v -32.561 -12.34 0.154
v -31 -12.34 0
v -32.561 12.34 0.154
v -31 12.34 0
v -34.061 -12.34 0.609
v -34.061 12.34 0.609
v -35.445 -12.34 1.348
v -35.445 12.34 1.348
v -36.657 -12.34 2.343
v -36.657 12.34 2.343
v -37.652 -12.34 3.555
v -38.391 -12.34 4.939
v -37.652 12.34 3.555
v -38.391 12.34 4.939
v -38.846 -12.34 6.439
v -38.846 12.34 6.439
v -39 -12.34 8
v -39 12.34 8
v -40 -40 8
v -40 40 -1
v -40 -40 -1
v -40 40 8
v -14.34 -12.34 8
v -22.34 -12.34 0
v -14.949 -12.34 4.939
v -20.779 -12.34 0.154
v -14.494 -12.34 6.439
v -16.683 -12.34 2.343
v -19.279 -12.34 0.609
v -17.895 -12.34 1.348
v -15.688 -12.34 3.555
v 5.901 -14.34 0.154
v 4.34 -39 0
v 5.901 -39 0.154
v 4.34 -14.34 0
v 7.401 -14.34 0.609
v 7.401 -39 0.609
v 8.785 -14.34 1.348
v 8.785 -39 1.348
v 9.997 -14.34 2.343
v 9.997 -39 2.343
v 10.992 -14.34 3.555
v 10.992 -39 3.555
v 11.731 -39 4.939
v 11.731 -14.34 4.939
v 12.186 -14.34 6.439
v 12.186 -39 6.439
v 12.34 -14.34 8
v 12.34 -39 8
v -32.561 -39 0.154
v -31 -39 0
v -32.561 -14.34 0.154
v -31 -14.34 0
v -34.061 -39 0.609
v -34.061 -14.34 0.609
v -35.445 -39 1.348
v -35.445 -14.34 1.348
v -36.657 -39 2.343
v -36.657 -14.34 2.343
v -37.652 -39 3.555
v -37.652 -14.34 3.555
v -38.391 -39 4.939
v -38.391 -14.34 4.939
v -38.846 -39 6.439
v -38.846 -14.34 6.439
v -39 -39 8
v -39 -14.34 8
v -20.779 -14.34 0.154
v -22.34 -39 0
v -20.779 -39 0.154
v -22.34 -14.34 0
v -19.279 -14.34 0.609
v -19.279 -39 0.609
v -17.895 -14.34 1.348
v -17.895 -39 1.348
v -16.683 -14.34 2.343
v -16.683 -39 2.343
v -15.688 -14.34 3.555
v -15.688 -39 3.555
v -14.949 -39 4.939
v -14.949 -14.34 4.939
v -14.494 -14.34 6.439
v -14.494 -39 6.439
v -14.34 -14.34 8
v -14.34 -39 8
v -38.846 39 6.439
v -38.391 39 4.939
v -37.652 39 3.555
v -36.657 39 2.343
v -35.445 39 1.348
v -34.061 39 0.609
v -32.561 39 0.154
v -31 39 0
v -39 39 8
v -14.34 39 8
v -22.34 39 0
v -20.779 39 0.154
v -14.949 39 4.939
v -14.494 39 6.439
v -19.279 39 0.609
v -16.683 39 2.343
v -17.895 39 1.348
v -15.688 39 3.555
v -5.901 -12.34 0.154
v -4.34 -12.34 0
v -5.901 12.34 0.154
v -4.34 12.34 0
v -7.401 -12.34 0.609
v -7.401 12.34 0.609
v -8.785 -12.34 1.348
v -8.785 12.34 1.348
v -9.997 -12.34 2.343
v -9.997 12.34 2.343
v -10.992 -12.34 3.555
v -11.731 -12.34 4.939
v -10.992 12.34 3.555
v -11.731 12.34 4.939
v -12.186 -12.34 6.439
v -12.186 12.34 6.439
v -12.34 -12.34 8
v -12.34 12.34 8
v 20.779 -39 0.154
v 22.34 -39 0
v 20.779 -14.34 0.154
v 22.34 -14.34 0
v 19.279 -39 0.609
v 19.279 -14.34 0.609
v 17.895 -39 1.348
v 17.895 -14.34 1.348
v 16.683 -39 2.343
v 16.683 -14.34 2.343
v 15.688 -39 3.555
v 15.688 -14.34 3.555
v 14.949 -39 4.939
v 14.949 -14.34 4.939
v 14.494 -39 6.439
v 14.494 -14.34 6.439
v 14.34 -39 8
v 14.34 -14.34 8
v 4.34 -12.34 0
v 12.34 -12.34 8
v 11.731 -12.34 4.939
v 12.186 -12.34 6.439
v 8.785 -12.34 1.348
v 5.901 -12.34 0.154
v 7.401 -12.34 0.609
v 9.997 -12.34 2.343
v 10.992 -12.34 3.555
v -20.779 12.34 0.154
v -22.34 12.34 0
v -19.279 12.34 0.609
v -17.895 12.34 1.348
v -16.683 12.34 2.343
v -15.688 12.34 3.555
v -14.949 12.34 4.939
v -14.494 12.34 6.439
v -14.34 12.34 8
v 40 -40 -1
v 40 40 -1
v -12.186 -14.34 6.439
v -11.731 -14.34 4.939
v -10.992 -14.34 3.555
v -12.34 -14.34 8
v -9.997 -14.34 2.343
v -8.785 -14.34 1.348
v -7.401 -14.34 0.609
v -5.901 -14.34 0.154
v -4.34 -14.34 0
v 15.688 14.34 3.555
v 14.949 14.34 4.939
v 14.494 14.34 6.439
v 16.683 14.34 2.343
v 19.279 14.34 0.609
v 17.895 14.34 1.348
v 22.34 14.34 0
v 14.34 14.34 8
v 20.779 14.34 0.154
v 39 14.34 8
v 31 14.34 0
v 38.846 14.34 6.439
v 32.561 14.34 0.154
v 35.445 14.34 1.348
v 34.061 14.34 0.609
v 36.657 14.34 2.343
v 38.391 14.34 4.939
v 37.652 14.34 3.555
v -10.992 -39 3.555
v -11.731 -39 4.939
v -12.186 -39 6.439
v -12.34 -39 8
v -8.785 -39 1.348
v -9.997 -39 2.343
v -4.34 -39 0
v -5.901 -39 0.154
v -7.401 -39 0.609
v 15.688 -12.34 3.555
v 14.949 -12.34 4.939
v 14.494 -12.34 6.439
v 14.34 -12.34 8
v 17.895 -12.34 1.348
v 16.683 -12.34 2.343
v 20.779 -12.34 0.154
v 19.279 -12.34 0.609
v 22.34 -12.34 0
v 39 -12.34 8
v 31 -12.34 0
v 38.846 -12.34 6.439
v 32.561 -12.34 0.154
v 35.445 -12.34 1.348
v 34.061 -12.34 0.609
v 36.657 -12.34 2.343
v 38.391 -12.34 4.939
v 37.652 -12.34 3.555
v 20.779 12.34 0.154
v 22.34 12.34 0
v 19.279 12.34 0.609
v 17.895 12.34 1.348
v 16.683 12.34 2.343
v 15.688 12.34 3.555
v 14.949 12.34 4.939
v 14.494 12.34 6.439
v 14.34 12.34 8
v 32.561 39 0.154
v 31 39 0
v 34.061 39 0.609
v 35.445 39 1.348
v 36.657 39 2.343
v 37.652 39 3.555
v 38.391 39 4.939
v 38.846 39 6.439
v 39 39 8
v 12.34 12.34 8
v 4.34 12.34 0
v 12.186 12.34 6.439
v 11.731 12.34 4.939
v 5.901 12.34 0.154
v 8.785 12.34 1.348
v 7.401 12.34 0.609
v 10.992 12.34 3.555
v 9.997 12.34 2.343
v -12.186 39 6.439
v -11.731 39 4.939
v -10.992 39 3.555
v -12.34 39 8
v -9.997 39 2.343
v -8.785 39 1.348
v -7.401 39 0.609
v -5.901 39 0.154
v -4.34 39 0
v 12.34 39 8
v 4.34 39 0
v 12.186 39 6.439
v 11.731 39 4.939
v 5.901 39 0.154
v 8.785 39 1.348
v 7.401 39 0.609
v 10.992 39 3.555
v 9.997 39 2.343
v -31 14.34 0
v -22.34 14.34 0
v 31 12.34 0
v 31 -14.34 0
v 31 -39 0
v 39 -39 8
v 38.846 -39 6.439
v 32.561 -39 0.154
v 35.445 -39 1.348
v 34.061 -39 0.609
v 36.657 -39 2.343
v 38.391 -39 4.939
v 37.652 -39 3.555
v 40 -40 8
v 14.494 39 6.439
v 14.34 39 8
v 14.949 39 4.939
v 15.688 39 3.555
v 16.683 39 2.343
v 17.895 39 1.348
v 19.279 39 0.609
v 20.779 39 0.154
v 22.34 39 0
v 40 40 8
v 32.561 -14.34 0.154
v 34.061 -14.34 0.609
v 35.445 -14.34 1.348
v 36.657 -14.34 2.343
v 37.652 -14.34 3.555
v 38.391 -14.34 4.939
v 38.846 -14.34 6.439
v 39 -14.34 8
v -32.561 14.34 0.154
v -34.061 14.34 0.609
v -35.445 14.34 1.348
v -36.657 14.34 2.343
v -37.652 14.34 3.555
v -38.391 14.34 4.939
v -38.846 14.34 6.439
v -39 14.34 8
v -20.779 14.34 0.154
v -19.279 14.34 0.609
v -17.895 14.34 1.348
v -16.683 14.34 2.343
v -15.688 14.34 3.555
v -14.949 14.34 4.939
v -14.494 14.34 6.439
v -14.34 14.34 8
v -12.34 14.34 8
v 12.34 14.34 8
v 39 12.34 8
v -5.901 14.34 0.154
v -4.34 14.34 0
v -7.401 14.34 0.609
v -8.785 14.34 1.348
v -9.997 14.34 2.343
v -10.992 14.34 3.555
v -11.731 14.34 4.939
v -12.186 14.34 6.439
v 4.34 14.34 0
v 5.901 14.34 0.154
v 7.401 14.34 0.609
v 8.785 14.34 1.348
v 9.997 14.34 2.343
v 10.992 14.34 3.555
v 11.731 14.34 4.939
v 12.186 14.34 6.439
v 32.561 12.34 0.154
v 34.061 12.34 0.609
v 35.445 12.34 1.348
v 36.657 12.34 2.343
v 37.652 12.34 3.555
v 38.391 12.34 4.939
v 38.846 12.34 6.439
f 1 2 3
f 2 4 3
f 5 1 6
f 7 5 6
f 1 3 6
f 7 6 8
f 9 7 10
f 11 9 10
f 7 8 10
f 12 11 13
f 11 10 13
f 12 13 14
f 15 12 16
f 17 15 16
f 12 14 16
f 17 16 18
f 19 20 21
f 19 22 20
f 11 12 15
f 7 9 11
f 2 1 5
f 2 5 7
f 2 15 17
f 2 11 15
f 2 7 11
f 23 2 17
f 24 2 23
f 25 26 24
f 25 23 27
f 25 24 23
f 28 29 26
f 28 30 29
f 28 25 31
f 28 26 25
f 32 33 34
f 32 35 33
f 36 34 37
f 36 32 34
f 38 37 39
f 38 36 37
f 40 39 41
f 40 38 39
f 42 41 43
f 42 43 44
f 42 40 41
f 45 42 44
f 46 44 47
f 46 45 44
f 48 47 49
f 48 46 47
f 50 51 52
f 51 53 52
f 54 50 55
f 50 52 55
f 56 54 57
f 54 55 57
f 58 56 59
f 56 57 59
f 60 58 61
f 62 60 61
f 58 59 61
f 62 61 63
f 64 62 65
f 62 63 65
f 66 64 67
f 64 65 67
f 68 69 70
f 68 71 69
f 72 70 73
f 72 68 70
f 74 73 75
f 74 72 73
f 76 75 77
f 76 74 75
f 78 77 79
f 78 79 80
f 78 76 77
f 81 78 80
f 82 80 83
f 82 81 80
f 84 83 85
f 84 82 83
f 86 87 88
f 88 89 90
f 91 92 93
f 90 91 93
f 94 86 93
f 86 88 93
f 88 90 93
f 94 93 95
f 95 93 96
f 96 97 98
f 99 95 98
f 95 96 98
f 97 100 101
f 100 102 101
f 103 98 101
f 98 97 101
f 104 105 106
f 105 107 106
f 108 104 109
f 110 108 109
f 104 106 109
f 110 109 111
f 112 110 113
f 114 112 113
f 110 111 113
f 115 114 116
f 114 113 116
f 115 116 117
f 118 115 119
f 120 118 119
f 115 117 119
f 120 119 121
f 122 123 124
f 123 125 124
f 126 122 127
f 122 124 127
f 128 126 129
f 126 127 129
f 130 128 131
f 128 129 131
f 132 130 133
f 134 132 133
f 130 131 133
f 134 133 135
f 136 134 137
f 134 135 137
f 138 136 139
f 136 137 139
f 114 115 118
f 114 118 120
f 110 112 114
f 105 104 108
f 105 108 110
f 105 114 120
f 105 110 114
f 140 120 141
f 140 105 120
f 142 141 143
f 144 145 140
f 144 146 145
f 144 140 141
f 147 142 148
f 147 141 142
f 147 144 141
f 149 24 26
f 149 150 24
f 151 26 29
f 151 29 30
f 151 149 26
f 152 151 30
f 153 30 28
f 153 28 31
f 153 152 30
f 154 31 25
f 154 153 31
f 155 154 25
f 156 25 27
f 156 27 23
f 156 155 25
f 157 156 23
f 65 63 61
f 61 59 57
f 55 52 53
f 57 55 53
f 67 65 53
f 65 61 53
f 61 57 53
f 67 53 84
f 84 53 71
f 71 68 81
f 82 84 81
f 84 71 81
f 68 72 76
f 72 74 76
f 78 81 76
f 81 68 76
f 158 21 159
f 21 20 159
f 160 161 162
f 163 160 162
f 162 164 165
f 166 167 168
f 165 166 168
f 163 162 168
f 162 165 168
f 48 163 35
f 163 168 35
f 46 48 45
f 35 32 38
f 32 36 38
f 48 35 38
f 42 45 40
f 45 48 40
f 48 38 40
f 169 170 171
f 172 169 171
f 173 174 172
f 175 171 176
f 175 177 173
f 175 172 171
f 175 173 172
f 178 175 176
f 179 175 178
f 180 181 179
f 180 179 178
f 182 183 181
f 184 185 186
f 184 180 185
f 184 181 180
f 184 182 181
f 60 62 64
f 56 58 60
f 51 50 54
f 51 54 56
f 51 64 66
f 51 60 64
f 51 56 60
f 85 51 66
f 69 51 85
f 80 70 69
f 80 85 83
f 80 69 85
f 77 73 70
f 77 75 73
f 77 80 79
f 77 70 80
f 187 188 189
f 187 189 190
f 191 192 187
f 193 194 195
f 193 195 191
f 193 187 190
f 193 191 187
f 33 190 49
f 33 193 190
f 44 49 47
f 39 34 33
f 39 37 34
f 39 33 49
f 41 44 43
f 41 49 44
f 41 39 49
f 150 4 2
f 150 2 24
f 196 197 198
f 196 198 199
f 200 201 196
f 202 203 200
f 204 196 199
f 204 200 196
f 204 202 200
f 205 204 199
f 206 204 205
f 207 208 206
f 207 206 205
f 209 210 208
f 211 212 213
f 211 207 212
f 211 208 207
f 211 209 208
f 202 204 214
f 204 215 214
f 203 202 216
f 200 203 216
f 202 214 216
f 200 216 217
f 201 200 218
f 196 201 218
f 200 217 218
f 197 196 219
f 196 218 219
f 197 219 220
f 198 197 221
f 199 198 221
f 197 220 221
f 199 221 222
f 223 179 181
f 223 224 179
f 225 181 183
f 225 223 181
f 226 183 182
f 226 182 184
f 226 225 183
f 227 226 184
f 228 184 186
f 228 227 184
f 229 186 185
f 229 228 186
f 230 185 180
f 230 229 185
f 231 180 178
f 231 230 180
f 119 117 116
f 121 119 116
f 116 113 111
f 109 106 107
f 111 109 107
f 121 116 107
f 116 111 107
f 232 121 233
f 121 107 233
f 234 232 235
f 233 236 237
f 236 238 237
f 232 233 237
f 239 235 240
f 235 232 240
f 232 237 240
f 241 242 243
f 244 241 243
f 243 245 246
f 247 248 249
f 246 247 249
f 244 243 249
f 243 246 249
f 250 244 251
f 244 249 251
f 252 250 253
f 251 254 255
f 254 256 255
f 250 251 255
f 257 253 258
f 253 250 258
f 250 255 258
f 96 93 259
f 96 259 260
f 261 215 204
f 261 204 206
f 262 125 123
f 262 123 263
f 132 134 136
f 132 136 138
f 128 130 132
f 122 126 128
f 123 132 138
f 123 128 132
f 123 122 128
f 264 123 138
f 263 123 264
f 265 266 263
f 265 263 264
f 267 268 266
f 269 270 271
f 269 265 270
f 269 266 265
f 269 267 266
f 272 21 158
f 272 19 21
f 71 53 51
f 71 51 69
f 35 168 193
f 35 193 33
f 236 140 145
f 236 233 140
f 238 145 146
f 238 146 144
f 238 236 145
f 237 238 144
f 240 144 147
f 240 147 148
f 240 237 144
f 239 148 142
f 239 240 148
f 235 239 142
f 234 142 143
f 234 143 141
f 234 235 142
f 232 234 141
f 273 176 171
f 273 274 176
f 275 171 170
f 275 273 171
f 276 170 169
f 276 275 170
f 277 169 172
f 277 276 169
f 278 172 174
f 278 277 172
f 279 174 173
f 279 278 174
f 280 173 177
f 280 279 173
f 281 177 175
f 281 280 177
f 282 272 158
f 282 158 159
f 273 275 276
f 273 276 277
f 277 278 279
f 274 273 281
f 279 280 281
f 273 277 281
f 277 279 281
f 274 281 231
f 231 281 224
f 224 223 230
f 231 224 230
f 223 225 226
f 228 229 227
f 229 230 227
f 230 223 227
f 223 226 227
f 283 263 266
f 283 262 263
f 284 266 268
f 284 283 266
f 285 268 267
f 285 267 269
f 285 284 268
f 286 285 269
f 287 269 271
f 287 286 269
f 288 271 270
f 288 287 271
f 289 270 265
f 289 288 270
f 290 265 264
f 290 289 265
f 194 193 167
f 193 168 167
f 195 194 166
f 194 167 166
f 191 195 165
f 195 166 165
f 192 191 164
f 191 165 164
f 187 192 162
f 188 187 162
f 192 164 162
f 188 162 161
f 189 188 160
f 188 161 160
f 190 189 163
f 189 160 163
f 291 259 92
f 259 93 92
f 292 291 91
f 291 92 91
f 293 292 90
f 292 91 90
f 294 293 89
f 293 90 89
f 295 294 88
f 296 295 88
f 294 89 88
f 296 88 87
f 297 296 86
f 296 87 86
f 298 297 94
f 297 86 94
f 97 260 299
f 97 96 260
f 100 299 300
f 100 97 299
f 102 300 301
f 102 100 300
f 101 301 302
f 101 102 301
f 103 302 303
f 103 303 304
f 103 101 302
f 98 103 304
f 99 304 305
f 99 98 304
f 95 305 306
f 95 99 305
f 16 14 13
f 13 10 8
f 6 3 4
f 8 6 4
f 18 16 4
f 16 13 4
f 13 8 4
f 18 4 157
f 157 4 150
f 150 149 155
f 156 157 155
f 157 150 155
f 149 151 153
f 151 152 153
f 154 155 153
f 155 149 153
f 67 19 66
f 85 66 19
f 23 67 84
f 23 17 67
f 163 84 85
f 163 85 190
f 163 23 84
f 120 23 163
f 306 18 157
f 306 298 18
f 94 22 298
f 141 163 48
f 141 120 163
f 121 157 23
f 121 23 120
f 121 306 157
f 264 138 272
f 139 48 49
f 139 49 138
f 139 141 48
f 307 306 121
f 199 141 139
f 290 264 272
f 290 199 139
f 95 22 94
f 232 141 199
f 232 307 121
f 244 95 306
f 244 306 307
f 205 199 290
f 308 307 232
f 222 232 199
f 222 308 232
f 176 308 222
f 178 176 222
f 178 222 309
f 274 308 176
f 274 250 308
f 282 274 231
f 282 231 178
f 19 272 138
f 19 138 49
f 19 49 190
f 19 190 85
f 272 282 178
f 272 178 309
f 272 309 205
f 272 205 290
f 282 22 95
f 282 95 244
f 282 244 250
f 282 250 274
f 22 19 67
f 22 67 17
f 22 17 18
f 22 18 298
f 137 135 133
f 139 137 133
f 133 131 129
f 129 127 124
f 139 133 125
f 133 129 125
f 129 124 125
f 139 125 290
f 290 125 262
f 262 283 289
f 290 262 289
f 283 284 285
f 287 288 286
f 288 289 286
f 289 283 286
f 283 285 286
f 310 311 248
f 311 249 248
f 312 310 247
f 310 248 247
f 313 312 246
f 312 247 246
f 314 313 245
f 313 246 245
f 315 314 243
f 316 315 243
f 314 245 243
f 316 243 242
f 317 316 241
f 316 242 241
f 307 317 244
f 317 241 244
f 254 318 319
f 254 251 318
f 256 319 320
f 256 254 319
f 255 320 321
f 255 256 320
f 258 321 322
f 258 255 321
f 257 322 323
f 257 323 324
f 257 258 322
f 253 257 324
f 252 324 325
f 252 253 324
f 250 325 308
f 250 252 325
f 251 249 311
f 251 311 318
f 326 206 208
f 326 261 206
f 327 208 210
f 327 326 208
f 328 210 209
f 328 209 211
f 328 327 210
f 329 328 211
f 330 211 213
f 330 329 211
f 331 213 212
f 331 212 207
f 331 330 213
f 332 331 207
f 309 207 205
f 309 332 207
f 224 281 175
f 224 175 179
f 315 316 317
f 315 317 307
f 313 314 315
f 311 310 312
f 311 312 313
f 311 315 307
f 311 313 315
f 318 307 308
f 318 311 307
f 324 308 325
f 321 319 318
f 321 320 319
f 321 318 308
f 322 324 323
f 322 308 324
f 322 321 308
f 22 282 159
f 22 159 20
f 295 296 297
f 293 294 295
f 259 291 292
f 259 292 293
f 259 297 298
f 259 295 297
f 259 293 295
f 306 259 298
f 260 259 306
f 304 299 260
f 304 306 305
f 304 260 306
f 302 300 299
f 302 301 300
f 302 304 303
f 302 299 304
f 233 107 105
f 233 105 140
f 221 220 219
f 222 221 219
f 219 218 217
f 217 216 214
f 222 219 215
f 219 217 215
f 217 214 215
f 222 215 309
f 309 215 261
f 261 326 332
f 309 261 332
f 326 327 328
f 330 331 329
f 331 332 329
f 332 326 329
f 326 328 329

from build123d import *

# Parameters (mm, degrees)
F0_W     = 24.66
F0_H     = 24.66
F0_W_2   = 24.68
F0_H_2   = 24.68
F1_DEPTH = 8
F2_DEPTH = 1
F3_R     = 7.99999


# Not quite as in the source:
# - a fillet or chamfer is up to 0.001 mm smaller than in the source, because OpenCascade refuses the exact size


with BuildPart() as f1:
    # F0 (on Top) → F1 (new body)
    with BuildSketch(Plane.XY):
        Polygon((-40, -40), (40, -40), (40, 40), (-40, 40), (-40, -13.34), align=None)
        with Locations((-26.67, -26.67)):
            Rectangle(F0_W, F0_H, mode=Mode.SUBTRACT)
        with Locations((0, -26.67)):
            Rectangle(F0_W_2, F0_H, mode=Mode.SUBTRACT)
        with Locations((26.67, -26.67)):
            Rectangle(F0_W, F0_H, mode=Mode.SUBTRACT)
        with Locations((-26.67, 0)):
            Rectangle(F0_W, F0_H_2, mode=Mode.SUBTRACT)
        with Locations((-26.67, 26.67)):
            Rectangle(F0_W, F0_H, mode=Mode.SUBTRACT)
        Rectangle(F0_W_2, F0_H_2, mode=Mode.SUBTRACT)
        with Locations((26.67, 0)):
            Rectangle(F0_W, F0_H_2, mode=Mode.SUBTRACT)
        with Locations((0, 26.67)):
            Rectangle(F0_W_2, F0_H, mode=Mode.SUBTRACT)
        with Locations((26.67, 26.67)):
            Rectangle(F0_W, F0_H, mode=Mode.SUBTRACT)
    extrude(amount=F1_DEPTH)

    # F0 (on Top) → F2 (join)
    with BuildSketch(Plane.XY):
        Polygon((-40, -40), (40, -40), (40, 40), (-40, 40), (-40, -13.34), align=None)
        with Locations((-26.67, -26.67)):
            Rectangle(F0_W, F0_H, mode=Mode.SUBTRACT)
        with Locations((0, -26.67)):
            Rectangle(F0_W_2, F0_H, mode=Mode.SUBTRACT)
        with Locations((26.67, -26.67)):
            Rectangle(F0_W, F0_H, mode=Mode.SUBTRACT)
        with Locations((-26.67, 0)):
            Rectangle(F0_W, F0_H_2, mode=Mode.SUBTRACT)
        with Locations((-26.67, 26.67)):
            Rectangle(F0_W, F0_H, mode=Mode.SUBTRACT)
        Rectangle(F0_W_2, F0_H_2, mode=Mode.SUBTRACT)
        with Locations((26.67, 0)):
            Rectangle(F0_W, F0_H_2, mode=Mode.SUBTRACT)
        with Locations((0, 26.67)):
            Rectangle(F0_W_2, F0_H, mode=Mode.SUBTRACT)
        with Locations((26.67, 26.67)):
            Rectangle(F0_W, F0_H, mode=Mode.SUBTRACT)
        Rectangle(F0_W_2, F0_H_2)
        with Locations((-26.67, 0)):
            Rectangle(F0_W, F0_H_2)
        with Locations((0, -26.67)):
            Rectangle(F0_W_2, F0_H)
        with Locations((26.67, 0)):
            Rectangle(F0_W, F0_H_2)
        with Locations((0, 26.67)):
            Rectangle(F0_W_2, F0_H)
        with Locations((-26.67, -26.67)):
            Rectangle(F0_W, F0_H)
        with Locations((-26.67, 26.67)):
            Rectangle(F0_W, F0_H)
        with Locations((26.67, -26.67)):
            Rectangle(F0_W, F0_H)
        with Locations((26.67, 26.67)):
            Rectangle(F0_W, F0_H)
    extrude(amount=-F2_DEPTH)

    # F3 (radius 8 in the source; OpenCascade refuses exactly that, so slightly less here)
    f3_edges = [f1.edges().sort_by_distance(p)[0] for p in [
        (14.34, -26.67, 0),
        (14.34, 0, 0),
        (14.34, 26.67, 0),
        (-12.34, 26.67, 0),
        (-12.34, 0, 0),
        (-12.34, -26.67, 0),
        (-39, -26.67, 0),
        (-39, 0, 0),
        (-39, 26.67, 0),
        (12.34, -26.67, 0),
        (12.34, 0, 0),
        (12.34, 26.67, 0),
        (-14.34, 26.67, 0),
        (-14.34, 0, 0),
        (-14.34, -26.67, 0),
        (39, 26.67, 0),
        (39, 0, 0),
        (39, -26.67, 0),
    ]]
    fillet(f3_edges, radius=F3_R)


solid = f1.part
